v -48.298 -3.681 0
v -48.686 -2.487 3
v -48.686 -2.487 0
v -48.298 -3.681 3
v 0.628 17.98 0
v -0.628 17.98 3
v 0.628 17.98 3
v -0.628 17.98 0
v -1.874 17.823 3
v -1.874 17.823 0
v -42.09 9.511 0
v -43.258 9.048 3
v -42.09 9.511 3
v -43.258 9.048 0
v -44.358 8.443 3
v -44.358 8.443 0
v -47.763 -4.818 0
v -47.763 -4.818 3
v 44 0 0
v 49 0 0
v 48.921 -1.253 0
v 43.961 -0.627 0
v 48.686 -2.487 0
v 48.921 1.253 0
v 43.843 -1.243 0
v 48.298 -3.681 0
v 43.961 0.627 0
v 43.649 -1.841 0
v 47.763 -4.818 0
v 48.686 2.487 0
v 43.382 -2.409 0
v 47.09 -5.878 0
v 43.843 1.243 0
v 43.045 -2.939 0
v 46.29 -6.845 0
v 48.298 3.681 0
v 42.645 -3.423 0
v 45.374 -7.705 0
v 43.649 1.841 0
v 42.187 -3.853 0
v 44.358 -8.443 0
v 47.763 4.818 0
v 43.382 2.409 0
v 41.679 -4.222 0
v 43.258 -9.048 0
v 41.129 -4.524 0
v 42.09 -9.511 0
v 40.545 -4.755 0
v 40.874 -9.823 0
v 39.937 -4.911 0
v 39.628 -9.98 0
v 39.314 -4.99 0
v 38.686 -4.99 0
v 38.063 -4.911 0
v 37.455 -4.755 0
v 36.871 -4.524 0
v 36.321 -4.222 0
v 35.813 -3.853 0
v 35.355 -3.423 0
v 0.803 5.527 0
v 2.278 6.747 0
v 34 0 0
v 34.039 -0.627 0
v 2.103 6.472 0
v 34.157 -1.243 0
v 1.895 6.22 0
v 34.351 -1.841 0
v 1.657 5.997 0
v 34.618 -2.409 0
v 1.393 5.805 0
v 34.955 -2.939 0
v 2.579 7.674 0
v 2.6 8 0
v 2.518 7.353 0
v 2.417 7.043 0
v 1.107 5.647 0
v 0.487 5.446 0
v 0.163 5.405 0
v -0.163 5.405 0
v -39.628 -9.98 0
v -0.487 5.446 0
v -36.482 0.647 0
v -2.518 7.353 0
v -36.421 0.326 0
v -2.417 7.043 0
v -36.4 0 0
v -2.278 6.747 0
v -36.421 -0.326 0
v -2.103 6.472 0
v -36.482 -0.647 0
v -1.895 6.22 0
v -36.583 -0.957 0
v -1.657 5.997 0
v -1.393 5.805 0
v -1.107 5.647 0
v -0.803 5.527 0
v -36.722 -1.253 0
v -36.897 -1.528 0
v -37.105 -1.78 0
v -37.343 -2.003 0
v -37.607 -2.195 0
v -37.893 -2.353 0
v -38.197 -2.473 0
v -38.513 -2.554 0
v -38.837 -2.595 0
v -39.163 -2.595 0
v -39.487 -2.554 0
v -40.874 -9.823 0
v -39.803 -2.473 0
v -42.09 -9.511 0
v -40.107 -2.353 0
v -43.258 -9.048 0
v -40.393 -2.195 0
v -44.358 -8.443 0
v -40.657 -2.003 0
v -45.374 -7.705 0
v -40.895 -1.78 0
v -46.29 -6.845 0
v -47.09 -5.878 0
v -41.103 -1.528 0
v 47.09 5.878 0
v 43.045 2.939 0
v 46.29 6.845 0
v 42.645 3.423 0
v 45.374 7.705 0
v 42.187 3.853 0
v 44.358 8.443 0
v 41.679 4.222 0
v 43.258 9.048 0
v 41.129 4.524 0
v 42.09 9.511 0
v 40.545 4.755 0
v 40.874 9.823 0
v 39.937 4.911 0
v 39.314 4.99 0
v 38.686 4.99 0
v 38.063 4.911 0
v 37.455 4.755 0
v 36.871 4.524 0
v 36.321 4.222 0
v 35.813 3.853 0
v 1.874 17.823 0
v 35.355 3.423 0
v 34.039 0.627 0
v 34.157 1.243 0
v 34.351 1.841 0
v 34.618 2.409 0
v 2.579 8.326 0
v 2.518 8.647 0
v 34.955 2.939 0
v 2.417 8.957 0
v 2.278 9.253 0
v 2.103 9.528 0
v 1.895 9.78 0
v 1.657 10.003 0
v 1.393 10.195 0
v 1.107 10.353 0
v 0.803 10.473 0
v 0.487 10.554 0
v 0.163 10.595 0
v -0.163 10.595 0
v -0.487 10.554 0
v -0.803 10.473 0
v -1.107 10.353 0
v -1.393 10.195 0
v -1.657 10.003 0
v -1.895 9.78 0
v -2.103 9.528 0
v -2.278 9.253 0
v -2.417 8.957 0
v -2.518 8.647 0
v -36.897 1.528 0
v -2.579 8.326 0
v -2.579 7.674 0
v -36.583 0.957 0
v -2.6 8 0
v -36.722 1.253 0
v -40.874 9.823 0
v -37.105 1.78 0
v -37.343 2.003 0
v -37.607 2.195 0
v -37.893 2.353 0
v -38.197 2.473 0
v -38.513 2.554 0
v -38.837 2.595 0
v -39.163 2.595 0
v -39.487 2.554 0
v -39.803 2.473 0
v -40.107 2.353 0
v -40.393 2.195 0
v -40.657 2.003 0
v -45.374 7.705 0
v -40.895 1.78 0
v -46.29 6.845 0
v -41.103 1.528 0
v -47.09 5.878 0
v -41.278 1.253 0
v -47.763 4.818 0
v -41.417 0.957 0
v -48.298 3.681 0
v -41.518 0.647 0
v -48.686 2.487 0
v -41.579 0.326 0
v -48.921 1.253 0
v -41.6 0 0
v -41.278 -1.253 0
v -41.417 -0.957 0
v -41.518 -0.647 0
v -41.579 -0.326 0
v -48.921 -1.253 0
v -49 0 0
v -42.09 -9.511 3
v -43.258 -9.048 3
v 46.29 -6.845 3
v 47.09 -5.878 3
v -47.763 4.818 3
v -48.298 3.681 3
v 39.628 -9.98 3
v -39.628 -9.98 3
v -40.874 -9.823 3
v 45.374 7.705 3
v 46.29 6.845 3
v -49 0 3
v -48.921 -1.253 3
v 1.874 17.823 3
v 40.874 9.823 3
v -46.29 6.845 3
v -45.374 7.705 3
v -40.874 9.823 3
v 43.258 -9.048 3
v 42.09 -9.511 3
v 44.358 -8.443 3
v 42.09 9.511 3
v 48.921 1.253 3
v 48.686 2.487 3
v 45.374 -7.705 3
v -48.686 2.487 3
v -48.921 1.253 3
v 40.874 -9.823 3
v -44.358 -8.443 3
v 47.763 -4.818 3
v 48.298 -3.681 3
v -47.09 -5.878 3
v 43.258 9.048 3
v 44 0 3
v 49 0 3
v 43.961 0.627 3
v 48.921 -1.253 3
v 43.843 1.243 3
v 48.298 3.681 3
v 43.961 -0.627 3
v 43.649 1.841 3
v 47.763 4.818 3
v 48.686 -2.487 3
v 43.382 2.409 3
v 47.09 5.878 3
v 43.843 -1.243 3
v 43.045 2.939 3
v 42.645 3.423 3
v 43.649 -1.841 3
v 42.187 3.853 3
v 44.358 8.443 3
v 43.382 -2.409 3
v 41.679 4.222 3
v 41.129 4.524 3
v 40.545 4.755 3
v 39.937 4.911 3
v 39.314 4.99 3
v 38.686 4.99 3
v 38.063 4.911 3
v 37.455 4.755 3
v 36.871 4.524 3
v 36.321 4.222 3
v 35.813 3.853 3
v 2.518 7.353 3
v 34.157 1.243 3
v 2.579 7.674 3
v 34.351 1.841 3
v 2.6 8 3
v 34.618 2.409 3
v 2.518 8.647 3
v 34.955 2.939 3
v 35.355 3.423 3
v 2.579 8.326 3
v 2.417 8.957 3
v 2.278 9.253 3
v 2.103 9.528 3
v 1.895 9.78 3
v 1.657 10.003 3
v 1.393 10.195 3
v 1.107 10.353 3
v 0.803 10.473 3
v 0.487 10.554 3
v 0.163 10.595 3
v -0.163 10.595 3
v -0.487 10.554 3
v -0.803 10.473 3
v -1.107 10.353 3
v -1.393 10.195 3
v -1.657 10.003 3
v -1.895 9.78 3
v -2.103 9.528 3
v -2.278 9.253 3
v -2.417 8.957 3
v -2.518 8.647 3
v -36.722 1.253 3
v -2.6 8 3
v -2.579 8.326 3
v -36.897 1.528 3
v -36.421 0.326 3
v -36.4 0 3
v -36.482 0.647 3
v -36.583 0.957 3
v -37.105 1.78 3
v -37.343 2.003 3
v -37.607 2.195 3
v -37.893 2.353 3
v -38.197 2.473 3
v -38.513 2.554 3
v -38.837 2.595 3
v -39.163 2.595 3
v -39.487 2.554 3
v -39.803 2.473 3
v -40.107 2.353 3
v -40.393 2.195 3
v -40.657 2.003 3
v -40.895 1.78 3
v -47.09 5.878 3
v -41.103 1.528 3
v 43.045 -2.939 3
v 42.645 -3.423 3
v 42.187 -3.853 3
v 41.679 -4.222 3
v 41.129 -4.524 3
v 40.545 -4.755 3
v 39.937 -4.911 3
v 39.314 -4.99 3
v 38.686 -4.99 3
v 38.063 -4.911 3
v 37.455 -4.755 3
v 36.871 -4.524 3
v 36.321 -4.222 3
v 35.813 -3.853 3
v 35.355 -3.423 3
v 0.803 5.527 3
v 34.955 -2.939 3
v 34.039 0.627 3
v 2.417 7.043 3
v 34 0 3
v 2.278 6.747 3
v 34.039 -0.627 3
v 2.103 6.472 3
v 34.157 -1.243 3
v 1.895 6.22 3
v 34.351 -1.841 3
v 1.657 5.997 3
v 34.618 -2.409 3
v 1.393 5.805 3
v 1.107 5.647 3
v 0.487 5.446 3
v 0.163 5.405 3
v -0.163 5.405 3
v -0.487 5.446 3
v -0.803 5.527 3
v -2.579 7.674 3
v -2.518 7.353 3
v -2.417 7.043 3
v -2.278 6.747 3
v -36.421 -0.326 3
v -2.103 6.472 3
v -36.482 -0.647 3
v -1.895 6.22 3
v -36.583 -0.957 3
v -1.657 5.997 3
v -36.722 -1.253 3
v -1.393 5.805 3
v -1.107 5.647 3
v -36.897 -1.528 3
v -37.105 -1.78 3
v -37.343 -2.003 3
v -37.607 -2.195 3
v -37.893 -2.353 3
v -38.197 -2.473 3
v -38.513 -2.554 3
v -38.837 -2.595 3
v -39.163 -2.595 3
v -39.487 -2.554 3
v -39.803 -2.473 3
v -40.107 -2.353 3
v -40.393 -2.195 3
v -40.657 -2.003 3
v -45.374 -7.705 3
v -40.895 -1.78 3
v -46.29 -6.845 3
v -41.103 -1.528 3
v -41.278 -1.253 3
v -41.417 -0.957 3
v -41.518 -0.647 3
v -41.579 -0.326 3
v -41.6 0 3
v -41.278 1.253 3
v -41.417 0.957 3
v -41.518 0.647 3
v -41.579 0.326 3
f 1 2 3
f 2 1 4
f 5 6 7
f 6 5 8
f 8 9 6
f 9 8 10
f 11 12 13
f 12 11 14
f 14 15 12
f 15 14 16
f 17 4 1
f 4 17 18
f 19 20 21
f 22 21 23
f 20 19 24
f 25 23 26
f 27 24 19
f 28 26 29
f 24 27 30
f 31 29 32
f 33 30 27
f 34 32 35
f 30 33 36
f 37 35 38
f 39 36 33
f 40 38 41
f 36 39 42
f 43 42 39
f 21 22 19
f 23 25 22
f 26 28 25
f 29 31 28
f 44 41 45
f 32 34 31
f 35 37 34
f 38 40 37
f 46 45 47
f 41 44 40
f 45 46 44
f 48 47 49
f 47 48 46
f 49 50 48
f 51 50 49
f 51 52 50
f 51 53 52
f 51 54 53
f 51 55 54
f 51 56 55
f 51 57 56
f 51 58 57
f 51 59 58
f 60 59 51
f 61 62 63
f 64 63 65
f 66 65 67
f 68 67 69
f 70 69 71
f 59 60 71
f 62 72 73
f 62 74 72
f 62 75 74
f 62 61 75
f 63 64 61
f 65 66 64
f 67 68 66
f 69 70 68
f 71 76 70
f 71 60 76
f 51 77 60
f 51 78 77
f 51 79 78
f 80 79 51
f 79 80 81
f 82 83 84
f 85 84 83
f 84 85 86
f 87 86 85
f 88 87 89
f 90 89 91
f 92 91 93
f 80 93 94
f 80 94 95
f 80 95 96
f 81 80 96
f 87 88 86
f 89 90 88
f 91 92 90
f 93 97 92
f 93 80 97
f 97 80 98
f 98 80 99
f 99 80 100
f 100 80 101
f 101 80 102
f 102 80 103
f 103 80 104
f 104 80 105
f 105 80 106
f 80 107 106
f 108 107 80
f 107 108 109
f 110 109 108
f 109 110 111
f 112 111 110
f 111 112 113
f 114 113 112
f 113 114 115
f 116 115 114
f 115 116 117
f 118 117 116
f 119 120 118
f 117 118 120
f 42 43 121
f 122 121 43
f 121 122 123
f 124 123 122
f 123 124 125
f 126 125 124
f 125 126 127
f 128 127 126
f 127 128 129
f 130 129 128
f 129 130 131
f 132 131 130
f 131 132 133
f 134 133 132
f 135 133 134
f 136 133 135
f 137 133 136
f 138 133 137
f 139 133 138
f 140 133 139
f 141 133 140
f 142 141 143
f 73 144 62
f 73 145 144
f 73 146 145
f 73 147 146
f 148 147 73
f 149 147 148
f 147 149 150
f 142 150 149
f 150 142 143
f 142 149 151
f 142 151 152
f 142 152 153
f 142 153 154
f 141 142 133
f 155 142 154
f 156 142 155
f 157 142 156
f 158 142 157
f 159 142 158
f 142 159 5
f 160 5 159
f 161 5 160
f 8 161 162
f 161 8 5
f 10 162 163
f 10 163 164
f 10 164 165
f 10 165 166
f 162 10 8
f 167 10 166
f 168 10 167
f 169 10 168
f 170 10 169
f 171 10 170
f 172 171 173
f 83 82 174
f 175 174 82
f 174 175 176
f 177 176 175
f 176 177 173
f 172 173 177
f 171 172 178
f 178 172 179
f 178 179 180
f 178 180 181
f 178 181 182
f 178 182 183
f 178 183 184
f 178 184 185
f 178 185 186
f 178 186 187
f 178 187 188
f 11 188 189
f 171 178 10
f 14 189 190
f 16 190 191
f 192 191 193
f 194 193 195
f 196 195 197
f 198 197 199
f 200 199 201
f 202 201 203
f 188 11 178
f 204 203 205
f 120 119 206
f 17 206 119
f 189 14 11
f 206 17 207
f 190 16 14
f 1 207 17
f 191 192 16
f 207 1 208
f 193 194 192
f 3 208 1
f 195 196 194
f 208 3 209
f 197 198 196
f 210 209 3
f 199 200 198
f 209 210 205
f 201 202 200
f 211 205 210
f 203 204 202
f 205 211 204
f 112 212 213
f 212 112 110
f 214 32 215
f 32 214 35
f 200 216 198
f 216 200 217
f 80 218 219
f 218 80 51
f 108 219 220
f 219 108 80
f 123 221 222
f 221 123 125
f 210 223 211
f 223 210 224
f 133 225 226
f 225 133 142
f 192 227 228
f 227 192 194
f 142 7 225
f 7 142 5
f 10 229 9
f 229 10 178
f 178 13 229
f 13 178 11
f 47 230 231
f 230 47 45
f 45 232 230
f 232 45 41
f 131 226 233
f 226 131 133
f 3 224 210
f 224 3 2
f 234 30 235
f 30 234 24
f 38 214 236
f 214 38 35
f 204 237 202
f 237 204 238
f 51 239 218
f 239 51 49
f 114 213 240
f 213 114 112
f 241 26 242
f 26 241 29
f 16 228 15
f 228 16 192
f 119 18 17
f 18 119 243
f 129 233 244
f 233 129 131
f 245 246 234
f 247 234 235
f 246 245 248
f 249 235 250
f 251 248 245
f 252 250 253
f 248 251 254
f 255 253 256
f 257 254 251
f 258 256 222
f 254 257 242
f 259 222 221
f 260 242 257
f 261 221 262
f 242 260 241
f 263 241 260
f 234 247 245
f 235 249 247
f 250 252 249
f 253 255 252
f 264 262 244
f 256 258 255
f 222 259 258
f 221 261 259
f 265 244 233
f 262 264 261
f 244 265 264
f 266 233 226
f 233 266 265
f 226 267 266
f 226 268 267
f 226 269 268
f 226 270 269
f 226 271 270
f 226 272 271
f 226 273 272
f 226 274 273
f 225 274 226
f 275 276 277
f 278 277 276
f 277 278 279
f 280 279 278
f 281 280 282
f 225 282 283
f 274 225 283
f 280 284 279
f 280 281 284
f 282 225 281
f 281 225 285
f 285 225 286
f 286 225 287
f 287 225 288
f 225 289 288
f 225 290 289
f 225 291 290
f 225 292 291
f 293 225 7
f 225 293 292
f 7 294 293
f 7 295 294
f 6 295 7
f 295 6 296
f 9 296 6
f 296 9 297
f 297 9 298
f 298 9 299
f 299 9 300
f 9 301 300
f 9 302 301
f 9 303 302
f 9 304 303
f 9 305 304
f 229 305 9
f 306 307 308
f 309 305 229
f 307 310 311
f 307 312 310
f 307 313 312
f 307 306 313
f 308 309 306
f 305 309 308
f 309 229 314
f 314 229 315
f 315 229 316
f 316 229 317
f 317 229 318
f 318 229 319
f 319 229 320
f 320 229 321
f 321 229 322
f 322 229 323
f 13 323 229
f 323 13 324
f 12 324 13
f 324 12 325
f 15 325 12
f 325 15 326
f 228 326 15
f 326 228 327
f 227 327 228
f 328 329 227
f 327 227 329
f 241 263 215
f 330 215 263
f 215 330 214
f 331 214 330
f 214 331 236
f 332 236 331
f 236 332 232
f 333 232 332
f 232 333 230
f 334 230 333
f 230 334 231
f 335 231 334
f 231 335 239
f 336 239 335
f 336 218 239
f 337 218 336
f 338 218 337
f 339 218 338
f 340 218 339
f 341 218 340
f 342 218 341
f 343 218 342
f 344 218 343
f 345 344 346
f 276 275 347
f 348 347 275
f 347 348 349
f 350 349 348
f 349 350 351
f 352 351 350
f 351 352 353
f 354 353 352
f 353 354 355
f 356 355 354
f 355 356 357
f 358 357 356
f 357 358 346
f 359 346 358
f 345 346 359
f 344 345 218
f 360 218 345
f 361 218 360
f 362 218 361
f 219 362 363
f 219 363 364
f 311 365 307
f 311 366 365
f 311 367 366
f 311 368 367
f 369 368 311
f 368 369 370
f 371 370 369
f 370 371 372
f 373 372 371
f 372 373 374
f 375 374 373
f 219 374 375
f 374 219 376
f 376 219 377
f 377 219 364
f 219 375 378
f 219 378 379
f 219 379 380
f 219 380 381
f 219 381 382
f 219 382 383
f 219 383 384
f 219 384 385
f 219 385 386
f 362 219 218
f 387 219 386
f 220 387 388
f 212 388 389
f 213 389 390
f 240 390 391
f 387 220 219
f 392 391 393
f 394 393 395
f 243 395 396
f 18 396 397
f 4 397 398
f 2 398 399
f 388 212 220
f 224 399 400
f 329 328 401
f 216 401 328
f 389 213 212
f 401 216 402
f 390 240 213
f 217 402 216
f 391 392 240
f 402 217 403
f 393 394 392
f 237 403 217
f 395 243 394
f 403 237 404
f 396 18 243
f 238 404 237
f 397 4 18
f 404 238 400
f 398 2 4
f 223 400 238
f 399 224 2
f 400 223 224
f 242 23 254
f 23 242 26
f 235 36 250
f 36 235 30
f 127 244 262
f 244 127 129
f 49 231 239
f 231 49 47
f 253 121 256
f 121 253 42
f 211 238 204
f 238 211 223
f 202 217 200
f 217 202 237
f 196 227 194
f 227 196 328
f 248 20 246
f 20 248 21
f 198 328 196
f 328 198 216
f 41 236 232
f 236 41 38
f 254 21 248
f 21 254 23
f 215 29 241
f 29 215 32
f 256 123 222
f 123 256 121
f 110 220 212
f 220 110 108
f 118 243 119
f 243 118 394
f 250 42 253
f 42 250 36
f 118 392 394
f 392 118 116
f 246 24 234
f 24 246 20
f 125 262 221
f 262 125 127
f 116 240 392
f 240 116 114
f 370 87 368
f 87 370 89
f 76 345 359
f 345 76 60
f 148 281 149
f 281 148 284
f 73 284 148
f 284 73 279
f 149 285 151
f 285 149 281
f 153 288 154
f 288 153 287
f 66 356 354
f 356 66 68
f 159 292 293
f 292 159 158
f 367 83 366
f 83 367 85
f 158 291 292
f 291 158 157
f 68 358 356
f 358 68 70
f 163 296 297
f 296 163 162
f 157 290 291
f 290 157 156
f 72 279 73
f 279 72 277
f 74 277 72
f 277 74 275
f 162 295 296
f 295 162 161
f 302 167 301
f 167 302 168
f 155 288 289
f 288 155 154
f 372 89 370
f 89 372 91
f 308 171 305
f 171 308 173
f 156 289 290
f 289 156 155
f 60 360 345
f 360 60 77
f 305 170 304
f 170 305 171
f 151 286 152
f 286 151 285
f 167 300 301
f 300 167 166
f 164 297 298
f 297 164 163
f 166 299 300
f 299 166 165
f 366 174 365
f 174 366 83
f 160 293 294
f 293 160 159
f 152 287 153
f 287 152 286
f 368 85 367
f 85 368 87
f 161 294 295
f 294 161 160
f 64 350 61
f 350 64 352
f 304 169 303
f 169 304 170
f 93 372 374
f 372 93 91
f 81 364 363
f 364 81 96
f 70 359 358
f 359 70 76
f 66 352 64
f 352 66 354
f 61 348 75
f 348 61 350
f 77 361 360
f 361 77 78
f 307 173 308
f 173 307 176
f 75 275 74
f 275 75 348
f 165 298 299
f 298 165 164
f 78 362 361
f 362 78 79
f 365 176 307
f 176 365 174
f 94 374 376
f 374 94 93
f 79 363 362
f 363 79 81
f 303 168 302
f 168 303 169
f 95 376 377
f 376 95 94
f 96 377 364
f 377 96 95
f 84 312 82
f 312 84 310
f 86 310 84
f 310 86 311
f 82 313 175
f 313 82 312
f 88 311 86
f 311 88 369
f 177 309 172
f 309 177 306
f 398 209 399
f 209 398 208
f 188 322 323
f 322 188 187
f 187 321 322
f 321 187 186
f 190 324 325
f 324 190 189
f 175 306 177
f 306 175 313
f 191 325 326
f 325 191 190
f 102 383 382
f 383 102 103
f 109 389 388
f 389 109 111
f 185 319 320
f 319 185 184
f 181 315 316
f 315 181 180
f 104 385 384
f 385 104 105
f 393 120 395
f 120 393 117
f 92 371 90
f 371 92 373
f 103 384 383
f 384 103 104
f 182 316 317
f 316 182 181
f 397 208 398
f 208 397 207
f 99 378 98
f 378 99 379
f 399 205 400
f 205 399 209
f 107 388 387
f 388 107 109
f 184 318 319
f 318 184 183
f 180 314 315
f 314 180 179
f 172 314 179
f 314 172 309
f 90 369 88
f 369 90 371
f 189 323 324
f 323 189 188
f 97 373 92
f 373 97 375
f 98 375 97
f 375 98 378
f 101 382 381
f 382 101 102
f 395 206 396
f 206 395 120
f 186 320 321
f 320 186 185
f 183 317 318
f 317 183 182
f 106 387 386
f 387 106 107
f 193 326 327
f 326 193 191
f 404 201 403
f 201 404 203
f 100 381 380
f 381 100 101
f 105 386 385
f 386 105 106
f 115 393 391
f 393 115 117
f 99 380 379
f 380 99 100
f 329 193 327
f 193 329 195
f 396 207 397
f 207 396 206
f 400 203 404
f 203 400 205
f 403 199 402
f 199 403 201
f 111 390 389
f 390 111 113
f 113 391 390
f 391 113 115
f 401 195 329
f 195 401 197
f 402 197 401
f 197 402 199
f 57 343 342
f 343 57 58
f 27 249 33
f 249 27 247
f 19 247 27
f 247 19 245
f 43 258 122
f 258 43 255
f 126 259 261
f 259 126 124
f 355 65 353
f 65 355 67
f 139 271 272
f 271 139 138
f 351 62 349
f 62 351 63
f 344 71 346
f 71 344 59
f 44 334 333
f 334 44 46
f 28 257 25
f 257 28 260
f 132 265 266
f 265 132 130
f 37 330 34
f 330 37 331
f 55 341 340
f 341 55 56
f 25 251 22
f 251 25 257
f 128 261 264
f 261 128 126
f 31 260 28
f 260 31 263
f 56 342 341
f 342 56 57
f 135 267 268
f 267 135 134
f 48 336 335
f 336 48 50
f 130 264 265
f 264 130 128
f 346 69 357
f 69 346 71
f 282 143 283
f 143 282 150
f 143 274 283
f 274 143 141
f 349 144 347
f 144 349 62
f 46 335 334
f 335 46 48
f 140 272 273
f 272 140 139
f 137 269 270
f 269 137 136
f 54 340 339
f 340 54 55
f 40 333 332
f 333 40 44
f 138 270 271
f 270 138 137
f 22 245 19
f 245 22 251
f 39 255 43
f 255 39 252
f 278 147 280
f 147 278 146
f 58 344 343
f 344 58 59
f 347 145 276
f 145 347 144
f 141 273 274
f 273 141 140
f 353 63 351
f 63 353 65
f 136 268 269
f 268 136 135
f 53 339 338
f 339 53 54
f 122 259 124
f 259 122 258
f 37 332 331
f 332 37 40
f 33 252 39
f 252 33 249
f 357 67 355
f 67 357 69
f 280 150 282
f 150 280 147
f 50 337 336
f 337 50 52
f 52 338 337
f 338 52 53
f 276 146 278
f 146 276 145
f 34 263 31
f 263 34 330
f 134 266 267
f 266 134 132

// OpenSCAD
HOLE_DIST = 78;
HOLE_DIA = 5.2;

BEARING_DIA = 10;
CENTER_OFFSET = 8;

FRAME_DIA = 20;
FRAME_THICKNESS = 3;


$fn = 50;

module frame() {
  difference() {
    hull() {
      for(i = [-1, 1]) {
        translate([i * HOLE_DIST/2, 0, 0])
        cylinder(d = FRAME_DIA, h = FRAME_THICKNESS);
      }

      translate([0, CENTER_OFFSET, 0])
      cylinder(d = FRAME_DIA, h = FRAME_THICKNESS);
    }

    translate([0, CENTER_OFFSET, 0])
    cylinder(d = HOLE_DIA, h = FRAME_THICKNESS);

    translate([-HOLE_DIST/2, 0, 0])
    cylinder(d = HOLE_DIA, h = FRAME_THICKNESS);

    translate([HOLE_DIST/2, 0, 0])
    cylinder(d = BEARING_DIA, h = FRAME_THICKNESS);
  }
}

frame();
